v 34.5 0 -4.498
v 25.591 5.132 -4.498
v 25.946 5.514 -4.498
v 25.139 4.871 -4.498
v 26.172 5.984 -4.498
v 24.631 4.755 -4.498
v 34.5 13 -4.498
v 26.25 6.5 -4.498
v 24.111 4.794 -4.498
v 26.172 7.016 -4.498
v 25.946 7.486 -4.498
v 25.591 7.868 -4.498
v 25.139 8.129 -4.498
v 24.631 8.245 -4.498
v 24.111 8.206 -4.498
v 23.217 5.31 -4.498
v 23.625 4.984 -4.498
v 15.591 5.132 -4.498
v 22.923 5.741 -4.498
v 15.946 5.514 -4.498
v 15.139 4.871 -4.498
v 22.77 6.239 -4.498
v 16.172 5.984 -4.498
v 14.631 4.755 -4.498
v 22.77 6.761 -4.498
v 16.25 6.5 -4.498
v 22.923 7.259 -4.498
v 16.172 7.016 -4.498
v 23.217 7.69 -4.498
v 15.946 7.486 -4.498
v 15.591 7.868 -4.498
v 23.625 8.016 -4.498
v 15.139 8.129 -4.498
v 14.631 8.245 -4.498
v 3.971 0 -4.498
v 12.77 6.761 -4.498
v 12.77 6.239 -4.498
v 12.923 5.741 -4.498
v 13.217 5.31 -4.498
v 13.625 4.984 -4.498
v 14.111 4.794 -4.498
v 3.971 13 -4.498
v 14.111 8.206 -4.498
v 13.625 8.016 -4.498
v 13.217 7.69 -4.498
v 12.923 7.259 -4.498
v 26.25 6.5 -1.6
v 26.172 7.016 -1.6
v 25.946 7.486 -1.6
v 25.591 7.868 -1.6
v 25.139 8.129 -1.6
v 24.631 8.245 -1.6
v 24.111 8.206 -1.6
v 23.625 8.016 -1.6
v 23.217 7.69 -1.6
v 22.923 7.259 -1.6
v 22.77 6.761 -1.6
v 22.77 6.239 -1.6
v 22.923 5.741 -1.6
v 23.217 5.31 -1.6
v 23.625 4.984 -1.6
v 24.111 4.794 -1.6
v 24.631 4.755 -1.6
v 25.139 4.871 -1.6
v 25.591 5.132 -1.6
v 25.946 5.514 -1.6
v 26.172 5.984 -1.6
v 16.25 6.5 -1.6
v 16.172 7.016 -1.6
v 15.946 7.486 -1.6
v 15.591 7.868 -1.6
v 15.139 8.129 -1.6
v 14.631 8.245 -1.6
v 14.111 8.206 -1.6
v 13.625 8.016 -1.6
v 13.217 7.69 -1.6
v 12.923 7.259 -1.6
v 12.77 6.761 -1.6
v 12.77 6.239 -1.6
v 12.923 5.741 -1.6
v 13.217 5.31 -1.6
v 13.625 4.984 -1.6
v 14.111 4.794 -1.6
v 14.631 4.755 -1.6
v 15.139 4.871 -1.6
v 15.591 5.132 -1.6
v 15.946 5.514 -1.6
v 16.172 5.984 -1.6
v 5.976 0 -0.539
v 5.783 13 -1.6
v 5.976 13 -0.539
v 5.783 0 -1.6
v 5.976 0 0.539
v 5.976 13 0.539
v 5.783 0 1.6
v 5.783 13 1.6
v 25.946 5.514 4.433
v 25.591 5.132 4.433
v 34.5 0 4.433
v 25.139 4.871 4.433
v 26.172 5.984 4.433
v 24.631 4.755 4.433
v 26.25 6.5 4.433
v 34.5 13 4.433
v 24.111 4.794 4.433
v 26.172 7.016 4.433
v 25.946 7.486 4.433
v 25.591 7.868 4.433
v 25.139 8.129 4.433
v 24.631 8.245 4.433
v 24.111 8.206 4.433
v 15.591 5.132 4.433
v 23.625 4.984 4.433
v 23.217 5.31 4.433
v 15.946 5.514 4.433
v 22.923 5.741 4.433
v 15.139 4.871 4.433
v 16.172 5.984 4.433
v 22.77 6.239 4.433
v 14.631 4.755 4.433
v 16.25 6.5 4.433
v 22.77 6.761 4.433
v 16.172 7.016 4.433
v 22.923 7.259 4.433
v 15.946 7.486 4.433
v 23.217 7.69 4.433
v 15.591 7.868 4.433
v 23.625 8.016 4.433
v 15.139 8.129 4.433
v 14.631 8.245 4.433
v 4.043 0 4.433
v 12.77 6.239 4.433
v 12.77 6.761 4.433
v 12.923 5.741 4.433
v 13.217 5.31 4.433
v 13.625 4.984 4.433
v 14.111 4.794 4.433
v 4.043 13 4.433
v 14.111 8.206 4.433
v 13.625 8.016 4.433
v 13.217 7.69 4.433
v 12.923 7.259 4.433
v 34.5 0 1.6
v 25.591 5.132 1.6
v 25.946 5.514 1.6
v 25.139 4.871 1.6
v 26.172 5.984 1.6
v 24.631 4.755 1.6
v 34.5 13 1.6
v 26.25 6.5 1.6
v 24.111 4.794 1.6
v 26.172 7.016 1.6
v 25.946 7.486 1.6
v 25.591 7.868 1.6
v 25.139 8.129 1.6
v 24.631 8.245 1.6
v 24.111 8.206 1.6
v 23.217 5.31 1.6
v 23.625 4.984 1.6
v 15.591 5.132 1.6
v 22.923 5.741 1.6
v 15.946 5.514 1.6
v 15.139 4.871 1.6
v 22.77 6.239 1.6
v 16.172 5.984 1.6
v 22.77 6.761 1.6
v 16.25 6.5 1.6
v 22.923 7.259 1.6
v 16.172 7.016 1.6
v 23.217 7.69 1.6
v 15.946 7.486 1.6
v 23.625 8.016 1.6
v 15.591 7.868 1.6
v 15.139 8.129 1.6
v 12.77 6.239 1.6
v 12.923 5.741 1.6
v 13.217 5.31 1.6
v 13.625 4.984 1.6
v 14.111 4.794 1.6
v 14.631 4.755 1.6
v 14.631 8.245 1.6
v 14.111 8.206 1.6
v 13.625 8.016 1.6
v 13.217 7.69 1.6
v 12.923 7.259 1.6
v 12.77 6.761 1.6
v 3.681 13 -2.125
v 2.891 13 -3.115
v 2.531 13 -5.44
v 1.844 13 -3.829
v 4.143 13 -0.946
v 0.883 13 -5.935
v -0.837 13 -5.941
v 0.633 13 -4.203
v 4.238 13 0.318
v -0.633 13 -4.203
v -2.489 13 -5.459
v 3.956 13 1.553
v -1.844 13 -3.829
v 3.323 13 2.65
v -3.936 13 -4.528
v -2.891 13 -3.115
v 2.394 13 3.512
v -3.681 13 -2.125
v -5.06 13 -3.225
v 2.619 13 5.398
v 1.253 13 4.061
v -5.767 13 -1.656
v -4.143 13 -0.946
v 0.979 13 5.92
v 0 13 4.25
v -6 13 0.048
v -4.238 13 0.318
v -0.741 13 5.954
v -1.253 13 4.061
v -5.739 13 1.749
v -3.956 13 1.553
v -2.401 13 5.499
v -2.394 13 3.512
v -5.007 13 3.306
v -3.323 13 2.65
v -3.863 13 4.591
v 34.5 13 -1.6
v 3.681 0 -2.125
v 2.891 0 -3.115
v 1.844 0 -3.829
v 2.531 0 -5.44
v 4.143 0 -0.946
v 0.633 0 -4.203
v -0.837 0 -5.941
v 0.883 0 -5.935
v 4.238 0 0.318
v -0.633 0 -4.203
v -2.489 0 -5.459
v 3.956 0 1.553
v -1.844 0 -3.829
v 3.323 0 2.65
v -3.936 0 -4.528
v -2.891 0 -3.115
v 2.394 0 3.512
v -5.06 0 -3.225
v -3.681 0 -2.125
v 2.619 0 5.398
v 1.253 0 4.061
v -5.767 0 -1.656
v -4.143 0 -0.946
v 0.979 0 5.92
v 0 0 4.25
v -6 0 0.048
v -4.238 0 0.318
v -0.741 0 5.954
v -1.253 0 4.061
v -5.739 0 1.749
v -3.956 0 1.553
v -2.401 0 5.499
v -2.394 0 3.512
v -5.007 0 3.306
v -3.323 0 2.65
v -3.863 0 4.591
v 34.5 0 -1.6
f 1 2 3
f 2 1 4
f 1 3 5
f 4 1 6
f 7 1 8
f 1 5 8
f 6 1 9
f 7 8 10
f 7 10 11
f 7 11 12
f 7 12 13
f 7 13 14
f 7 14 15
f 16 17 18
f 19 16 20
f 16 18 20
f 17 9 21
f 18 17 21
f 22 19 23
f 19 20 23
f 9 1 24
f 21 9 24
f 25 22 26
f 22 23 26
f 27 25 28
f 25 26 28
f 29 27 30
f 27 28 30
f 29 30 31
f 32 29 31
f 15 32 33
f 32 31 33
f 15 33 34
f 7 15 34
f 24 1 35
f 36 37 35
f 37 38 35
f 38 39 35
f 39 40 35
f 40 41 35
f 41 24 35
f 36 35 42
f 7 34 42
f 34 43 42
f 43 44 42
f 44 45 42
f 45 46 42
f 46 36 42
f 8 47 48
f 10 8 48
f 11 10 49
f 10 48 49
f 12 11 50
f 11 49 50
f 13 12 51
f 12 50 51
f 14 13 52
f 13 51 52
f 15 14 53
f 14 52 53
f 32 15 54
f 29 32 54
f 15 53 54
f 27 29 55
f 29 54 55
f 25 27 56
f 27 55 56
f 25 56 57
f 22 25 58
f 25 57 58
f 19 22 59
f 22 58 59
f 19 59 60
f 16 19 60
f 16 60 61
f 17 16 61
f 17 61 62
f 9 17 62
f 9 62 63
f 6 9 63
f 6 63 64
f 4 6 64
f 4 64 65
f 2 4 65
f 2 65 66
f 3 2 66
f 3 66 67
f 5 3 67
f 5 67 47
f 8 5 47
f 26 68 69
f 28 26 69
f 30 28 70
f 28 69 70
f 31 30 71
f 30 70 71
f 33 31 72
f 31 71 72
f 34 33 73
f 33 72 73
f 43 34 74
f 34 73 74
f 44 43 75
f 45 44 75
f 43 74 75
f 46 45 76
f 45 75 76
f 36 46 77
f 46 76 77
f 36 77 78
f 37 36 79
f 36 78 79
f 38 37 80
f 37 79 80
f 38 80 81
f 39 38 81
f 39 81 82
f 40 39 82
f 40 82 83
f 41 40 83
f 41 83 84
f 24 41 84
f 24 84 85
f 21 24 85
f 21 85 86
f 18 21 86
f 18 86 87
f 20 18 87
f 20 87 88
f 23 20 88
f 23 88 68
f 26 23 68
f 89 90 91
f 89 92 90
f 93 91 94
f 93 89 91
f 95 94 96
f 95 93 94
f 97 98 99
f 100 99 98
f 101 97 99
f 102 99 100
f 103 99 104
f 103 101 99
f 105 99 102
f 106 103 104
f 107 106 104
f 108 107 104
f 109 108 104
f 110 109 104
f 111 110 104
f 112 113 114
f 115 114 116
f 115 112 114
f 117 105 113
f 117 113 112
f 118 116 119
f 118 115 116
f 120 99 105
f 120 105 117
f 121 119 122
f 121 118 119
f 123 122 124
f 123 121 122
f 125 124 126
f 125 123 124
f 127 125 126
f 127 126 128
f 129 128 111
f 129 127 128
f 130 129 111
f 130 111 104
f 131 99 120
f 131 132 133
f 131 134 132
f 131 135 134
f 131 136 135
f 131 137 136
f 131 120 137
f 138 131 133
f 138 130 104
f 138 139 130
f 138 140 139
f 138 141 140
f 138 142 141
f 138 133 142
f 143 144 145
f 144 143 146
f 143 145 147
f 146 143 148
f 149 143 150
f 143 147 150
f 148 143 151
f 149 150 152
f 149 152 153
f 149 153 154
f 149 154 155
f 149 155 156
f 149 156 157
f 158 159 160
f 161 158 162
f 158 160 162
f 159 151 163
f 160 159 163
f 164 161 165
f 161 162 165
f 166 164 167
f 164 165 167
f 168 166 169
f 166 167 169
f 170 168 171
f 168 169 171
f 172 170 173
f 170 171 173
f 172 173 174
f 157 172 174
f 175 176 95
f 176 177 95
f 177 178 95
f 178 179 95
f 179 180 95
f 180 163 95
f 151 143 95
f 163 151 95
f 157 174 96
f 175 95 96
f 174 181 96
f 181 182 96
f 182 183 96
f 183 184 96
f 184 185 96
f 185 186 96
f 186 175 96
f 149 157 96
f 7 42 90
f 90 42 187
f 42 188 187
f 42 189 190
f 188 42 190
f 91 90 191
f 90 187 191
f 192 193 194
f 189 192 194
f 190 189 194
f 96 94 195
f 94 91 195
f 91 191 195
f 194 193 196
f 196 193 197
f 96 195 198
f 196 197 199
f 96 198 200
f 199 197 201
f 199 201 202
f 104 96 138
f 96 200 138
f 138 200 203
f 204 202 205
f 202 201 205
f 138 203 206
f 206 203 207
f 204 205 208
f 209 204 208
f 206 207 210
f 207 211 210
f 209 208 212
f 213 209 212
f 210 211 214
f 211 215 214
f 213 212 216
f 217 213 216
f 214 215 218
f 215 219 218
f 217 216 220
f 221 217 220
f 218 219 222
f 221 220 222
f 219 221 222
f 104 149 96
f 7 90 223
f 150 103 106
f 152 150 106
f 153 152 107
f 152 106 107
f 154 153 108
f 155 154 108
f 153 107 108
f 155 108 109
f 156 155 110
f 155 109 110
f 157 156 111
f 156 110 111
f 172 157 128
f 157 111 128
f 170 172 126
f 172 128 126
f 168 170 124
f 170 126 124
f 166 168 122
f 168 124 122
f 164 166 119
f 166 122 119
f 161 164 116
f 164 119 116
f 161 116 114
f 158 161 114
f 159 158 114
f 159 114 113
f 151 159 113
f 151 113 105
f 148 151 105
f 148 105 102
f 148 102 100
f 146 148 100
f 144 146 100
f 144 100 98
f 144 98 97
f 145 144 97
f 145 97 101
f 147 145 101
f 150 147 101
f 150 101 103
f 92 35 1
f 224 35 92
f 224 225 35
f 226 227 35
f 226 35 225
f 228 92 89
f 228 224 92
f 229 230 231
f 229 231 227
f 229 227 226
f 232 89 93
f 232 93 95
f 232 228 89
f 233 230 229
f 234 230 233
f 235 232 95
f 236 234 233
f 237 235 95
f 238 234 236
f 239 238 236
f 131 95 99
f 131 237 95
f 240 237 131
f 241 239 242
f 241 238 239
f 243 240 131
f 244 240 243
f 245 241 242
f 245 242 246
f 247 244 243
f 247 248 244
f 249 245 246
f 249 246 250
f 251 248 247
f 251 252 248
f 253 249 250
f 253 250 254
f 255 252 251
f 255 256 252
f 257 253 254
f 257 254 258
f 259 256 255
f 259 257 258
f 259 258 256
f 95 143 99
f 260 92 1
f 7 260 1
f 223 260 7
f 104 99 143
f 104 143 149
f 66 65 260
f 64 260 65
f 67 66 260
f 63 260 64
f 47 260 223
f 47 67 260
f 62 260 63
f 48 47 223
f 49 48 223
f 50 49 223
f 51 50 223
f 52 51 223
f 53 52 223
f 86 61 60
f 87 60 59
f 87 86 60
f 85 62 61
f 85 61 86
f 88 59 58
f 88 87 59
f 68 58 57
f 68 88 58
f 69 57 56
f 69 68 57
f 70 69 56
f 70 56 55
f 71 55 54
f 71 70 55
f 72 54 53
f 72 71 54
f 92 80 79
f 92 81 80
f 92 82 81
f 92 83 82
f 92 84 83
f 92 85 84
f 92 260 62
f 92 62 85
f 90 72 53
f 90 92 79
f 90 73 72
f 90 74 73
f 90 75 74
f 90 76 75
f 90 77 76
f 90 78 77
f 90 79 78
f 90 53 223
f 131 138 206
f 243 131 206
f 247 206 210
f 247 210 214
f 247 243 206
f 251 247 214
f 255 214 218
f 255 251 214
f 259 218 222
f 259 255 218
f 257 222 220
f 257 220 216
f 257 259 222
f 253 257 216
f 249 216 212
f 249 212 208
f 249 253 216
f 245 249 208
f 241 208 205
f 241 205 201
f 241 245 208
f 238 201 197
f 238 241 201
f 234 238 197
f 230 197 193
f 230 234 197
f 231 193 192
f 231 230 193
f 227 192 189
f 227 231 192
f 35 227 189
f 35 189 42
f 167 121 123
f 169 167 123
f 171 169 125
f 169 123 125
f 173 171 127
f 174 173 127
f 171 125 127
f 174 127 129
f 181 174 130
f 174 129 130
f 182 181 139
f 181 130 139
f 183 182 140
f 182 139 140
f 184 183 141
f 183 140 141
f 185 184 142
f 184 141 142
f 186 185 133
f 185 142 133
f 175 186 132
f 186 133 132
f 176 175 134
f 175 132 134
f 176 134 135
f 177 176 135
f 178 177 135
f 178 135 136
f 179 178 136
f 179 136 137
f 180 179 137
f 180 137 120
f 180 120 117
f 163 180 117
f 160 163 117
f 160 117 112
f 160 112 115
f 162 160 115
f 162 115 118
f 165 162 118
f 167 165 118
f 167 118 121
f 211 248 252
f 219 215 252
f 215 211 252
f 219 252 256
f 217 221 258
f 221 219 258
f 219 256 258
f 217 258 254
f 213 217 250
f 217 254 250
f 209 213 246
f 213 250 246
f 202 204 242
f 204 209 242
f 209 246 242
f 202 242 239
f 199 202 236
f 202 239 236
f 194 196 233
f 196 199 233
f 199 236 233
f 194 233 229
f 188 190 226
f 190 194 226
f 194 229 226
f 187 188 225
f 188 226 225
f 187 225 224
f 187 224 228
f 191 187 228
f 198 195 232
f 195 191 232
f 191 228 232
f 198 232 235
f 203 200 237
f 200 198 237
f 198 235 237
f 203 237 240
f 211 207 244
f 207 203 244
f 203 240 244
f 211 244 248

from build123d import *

# Parameters (mm, degrees)
F0_R     = 6
F0_R_2   = 4.25
F1_DEPTH = 13
F2_W     = 13
F2_H     = 2.833082
F2_H_2   = 2.897769
F3_DEPTH = 34.5
F4_R     = 4.25
F5_DEPTH = 13.001
F6_R     = 1.75
F7_DEPTH = 8.930851


with BuildPart() as f1:
    # F0 (on Front) → F1 (new body)
    with BuildSketch(Plane.XZ):
        Circle(F0_R)
        Circle(F0_R_2, mode=Mode.SUBTRACT)
    extrude(amount=-F1_DEPTH)

    # F2 (on Right) → F3 (join)
    with BuildSketch(Plane.YZ):
        with Locations((6.5, 3.016541)):
            Rectangle(F2_W, F2_H)
        with Locations((6.5, -3.048884)):
            Rectangle(F2_W, F2_H_2)
    extrude(amount=F3_DEPTH)

    # F4 (on face) → F5 (cut, through all)
    with BuildSketch(Plane(origin=(0, 13, 0), x_dir=(-1, 0, 0), z_dir=(0, 1, 0))):
        Circle(F4_R)
    extrude(amount=-F5_DEPTH, mode=Mode.SUBTRACT)

    # F6 (on face) → F7 (cut, through all)
    with BuildSketch(Plane.XY.offset(4.433082)):
        with Locations((14.5, 6.5)):
            Circle(F6_R)
        with Locations((24.5, 6.5)):
            Circle(F6_R)
    extrude(amount=-F7_DEPTH, mode=Mode.SUBTRACT)


solid = f1.part
